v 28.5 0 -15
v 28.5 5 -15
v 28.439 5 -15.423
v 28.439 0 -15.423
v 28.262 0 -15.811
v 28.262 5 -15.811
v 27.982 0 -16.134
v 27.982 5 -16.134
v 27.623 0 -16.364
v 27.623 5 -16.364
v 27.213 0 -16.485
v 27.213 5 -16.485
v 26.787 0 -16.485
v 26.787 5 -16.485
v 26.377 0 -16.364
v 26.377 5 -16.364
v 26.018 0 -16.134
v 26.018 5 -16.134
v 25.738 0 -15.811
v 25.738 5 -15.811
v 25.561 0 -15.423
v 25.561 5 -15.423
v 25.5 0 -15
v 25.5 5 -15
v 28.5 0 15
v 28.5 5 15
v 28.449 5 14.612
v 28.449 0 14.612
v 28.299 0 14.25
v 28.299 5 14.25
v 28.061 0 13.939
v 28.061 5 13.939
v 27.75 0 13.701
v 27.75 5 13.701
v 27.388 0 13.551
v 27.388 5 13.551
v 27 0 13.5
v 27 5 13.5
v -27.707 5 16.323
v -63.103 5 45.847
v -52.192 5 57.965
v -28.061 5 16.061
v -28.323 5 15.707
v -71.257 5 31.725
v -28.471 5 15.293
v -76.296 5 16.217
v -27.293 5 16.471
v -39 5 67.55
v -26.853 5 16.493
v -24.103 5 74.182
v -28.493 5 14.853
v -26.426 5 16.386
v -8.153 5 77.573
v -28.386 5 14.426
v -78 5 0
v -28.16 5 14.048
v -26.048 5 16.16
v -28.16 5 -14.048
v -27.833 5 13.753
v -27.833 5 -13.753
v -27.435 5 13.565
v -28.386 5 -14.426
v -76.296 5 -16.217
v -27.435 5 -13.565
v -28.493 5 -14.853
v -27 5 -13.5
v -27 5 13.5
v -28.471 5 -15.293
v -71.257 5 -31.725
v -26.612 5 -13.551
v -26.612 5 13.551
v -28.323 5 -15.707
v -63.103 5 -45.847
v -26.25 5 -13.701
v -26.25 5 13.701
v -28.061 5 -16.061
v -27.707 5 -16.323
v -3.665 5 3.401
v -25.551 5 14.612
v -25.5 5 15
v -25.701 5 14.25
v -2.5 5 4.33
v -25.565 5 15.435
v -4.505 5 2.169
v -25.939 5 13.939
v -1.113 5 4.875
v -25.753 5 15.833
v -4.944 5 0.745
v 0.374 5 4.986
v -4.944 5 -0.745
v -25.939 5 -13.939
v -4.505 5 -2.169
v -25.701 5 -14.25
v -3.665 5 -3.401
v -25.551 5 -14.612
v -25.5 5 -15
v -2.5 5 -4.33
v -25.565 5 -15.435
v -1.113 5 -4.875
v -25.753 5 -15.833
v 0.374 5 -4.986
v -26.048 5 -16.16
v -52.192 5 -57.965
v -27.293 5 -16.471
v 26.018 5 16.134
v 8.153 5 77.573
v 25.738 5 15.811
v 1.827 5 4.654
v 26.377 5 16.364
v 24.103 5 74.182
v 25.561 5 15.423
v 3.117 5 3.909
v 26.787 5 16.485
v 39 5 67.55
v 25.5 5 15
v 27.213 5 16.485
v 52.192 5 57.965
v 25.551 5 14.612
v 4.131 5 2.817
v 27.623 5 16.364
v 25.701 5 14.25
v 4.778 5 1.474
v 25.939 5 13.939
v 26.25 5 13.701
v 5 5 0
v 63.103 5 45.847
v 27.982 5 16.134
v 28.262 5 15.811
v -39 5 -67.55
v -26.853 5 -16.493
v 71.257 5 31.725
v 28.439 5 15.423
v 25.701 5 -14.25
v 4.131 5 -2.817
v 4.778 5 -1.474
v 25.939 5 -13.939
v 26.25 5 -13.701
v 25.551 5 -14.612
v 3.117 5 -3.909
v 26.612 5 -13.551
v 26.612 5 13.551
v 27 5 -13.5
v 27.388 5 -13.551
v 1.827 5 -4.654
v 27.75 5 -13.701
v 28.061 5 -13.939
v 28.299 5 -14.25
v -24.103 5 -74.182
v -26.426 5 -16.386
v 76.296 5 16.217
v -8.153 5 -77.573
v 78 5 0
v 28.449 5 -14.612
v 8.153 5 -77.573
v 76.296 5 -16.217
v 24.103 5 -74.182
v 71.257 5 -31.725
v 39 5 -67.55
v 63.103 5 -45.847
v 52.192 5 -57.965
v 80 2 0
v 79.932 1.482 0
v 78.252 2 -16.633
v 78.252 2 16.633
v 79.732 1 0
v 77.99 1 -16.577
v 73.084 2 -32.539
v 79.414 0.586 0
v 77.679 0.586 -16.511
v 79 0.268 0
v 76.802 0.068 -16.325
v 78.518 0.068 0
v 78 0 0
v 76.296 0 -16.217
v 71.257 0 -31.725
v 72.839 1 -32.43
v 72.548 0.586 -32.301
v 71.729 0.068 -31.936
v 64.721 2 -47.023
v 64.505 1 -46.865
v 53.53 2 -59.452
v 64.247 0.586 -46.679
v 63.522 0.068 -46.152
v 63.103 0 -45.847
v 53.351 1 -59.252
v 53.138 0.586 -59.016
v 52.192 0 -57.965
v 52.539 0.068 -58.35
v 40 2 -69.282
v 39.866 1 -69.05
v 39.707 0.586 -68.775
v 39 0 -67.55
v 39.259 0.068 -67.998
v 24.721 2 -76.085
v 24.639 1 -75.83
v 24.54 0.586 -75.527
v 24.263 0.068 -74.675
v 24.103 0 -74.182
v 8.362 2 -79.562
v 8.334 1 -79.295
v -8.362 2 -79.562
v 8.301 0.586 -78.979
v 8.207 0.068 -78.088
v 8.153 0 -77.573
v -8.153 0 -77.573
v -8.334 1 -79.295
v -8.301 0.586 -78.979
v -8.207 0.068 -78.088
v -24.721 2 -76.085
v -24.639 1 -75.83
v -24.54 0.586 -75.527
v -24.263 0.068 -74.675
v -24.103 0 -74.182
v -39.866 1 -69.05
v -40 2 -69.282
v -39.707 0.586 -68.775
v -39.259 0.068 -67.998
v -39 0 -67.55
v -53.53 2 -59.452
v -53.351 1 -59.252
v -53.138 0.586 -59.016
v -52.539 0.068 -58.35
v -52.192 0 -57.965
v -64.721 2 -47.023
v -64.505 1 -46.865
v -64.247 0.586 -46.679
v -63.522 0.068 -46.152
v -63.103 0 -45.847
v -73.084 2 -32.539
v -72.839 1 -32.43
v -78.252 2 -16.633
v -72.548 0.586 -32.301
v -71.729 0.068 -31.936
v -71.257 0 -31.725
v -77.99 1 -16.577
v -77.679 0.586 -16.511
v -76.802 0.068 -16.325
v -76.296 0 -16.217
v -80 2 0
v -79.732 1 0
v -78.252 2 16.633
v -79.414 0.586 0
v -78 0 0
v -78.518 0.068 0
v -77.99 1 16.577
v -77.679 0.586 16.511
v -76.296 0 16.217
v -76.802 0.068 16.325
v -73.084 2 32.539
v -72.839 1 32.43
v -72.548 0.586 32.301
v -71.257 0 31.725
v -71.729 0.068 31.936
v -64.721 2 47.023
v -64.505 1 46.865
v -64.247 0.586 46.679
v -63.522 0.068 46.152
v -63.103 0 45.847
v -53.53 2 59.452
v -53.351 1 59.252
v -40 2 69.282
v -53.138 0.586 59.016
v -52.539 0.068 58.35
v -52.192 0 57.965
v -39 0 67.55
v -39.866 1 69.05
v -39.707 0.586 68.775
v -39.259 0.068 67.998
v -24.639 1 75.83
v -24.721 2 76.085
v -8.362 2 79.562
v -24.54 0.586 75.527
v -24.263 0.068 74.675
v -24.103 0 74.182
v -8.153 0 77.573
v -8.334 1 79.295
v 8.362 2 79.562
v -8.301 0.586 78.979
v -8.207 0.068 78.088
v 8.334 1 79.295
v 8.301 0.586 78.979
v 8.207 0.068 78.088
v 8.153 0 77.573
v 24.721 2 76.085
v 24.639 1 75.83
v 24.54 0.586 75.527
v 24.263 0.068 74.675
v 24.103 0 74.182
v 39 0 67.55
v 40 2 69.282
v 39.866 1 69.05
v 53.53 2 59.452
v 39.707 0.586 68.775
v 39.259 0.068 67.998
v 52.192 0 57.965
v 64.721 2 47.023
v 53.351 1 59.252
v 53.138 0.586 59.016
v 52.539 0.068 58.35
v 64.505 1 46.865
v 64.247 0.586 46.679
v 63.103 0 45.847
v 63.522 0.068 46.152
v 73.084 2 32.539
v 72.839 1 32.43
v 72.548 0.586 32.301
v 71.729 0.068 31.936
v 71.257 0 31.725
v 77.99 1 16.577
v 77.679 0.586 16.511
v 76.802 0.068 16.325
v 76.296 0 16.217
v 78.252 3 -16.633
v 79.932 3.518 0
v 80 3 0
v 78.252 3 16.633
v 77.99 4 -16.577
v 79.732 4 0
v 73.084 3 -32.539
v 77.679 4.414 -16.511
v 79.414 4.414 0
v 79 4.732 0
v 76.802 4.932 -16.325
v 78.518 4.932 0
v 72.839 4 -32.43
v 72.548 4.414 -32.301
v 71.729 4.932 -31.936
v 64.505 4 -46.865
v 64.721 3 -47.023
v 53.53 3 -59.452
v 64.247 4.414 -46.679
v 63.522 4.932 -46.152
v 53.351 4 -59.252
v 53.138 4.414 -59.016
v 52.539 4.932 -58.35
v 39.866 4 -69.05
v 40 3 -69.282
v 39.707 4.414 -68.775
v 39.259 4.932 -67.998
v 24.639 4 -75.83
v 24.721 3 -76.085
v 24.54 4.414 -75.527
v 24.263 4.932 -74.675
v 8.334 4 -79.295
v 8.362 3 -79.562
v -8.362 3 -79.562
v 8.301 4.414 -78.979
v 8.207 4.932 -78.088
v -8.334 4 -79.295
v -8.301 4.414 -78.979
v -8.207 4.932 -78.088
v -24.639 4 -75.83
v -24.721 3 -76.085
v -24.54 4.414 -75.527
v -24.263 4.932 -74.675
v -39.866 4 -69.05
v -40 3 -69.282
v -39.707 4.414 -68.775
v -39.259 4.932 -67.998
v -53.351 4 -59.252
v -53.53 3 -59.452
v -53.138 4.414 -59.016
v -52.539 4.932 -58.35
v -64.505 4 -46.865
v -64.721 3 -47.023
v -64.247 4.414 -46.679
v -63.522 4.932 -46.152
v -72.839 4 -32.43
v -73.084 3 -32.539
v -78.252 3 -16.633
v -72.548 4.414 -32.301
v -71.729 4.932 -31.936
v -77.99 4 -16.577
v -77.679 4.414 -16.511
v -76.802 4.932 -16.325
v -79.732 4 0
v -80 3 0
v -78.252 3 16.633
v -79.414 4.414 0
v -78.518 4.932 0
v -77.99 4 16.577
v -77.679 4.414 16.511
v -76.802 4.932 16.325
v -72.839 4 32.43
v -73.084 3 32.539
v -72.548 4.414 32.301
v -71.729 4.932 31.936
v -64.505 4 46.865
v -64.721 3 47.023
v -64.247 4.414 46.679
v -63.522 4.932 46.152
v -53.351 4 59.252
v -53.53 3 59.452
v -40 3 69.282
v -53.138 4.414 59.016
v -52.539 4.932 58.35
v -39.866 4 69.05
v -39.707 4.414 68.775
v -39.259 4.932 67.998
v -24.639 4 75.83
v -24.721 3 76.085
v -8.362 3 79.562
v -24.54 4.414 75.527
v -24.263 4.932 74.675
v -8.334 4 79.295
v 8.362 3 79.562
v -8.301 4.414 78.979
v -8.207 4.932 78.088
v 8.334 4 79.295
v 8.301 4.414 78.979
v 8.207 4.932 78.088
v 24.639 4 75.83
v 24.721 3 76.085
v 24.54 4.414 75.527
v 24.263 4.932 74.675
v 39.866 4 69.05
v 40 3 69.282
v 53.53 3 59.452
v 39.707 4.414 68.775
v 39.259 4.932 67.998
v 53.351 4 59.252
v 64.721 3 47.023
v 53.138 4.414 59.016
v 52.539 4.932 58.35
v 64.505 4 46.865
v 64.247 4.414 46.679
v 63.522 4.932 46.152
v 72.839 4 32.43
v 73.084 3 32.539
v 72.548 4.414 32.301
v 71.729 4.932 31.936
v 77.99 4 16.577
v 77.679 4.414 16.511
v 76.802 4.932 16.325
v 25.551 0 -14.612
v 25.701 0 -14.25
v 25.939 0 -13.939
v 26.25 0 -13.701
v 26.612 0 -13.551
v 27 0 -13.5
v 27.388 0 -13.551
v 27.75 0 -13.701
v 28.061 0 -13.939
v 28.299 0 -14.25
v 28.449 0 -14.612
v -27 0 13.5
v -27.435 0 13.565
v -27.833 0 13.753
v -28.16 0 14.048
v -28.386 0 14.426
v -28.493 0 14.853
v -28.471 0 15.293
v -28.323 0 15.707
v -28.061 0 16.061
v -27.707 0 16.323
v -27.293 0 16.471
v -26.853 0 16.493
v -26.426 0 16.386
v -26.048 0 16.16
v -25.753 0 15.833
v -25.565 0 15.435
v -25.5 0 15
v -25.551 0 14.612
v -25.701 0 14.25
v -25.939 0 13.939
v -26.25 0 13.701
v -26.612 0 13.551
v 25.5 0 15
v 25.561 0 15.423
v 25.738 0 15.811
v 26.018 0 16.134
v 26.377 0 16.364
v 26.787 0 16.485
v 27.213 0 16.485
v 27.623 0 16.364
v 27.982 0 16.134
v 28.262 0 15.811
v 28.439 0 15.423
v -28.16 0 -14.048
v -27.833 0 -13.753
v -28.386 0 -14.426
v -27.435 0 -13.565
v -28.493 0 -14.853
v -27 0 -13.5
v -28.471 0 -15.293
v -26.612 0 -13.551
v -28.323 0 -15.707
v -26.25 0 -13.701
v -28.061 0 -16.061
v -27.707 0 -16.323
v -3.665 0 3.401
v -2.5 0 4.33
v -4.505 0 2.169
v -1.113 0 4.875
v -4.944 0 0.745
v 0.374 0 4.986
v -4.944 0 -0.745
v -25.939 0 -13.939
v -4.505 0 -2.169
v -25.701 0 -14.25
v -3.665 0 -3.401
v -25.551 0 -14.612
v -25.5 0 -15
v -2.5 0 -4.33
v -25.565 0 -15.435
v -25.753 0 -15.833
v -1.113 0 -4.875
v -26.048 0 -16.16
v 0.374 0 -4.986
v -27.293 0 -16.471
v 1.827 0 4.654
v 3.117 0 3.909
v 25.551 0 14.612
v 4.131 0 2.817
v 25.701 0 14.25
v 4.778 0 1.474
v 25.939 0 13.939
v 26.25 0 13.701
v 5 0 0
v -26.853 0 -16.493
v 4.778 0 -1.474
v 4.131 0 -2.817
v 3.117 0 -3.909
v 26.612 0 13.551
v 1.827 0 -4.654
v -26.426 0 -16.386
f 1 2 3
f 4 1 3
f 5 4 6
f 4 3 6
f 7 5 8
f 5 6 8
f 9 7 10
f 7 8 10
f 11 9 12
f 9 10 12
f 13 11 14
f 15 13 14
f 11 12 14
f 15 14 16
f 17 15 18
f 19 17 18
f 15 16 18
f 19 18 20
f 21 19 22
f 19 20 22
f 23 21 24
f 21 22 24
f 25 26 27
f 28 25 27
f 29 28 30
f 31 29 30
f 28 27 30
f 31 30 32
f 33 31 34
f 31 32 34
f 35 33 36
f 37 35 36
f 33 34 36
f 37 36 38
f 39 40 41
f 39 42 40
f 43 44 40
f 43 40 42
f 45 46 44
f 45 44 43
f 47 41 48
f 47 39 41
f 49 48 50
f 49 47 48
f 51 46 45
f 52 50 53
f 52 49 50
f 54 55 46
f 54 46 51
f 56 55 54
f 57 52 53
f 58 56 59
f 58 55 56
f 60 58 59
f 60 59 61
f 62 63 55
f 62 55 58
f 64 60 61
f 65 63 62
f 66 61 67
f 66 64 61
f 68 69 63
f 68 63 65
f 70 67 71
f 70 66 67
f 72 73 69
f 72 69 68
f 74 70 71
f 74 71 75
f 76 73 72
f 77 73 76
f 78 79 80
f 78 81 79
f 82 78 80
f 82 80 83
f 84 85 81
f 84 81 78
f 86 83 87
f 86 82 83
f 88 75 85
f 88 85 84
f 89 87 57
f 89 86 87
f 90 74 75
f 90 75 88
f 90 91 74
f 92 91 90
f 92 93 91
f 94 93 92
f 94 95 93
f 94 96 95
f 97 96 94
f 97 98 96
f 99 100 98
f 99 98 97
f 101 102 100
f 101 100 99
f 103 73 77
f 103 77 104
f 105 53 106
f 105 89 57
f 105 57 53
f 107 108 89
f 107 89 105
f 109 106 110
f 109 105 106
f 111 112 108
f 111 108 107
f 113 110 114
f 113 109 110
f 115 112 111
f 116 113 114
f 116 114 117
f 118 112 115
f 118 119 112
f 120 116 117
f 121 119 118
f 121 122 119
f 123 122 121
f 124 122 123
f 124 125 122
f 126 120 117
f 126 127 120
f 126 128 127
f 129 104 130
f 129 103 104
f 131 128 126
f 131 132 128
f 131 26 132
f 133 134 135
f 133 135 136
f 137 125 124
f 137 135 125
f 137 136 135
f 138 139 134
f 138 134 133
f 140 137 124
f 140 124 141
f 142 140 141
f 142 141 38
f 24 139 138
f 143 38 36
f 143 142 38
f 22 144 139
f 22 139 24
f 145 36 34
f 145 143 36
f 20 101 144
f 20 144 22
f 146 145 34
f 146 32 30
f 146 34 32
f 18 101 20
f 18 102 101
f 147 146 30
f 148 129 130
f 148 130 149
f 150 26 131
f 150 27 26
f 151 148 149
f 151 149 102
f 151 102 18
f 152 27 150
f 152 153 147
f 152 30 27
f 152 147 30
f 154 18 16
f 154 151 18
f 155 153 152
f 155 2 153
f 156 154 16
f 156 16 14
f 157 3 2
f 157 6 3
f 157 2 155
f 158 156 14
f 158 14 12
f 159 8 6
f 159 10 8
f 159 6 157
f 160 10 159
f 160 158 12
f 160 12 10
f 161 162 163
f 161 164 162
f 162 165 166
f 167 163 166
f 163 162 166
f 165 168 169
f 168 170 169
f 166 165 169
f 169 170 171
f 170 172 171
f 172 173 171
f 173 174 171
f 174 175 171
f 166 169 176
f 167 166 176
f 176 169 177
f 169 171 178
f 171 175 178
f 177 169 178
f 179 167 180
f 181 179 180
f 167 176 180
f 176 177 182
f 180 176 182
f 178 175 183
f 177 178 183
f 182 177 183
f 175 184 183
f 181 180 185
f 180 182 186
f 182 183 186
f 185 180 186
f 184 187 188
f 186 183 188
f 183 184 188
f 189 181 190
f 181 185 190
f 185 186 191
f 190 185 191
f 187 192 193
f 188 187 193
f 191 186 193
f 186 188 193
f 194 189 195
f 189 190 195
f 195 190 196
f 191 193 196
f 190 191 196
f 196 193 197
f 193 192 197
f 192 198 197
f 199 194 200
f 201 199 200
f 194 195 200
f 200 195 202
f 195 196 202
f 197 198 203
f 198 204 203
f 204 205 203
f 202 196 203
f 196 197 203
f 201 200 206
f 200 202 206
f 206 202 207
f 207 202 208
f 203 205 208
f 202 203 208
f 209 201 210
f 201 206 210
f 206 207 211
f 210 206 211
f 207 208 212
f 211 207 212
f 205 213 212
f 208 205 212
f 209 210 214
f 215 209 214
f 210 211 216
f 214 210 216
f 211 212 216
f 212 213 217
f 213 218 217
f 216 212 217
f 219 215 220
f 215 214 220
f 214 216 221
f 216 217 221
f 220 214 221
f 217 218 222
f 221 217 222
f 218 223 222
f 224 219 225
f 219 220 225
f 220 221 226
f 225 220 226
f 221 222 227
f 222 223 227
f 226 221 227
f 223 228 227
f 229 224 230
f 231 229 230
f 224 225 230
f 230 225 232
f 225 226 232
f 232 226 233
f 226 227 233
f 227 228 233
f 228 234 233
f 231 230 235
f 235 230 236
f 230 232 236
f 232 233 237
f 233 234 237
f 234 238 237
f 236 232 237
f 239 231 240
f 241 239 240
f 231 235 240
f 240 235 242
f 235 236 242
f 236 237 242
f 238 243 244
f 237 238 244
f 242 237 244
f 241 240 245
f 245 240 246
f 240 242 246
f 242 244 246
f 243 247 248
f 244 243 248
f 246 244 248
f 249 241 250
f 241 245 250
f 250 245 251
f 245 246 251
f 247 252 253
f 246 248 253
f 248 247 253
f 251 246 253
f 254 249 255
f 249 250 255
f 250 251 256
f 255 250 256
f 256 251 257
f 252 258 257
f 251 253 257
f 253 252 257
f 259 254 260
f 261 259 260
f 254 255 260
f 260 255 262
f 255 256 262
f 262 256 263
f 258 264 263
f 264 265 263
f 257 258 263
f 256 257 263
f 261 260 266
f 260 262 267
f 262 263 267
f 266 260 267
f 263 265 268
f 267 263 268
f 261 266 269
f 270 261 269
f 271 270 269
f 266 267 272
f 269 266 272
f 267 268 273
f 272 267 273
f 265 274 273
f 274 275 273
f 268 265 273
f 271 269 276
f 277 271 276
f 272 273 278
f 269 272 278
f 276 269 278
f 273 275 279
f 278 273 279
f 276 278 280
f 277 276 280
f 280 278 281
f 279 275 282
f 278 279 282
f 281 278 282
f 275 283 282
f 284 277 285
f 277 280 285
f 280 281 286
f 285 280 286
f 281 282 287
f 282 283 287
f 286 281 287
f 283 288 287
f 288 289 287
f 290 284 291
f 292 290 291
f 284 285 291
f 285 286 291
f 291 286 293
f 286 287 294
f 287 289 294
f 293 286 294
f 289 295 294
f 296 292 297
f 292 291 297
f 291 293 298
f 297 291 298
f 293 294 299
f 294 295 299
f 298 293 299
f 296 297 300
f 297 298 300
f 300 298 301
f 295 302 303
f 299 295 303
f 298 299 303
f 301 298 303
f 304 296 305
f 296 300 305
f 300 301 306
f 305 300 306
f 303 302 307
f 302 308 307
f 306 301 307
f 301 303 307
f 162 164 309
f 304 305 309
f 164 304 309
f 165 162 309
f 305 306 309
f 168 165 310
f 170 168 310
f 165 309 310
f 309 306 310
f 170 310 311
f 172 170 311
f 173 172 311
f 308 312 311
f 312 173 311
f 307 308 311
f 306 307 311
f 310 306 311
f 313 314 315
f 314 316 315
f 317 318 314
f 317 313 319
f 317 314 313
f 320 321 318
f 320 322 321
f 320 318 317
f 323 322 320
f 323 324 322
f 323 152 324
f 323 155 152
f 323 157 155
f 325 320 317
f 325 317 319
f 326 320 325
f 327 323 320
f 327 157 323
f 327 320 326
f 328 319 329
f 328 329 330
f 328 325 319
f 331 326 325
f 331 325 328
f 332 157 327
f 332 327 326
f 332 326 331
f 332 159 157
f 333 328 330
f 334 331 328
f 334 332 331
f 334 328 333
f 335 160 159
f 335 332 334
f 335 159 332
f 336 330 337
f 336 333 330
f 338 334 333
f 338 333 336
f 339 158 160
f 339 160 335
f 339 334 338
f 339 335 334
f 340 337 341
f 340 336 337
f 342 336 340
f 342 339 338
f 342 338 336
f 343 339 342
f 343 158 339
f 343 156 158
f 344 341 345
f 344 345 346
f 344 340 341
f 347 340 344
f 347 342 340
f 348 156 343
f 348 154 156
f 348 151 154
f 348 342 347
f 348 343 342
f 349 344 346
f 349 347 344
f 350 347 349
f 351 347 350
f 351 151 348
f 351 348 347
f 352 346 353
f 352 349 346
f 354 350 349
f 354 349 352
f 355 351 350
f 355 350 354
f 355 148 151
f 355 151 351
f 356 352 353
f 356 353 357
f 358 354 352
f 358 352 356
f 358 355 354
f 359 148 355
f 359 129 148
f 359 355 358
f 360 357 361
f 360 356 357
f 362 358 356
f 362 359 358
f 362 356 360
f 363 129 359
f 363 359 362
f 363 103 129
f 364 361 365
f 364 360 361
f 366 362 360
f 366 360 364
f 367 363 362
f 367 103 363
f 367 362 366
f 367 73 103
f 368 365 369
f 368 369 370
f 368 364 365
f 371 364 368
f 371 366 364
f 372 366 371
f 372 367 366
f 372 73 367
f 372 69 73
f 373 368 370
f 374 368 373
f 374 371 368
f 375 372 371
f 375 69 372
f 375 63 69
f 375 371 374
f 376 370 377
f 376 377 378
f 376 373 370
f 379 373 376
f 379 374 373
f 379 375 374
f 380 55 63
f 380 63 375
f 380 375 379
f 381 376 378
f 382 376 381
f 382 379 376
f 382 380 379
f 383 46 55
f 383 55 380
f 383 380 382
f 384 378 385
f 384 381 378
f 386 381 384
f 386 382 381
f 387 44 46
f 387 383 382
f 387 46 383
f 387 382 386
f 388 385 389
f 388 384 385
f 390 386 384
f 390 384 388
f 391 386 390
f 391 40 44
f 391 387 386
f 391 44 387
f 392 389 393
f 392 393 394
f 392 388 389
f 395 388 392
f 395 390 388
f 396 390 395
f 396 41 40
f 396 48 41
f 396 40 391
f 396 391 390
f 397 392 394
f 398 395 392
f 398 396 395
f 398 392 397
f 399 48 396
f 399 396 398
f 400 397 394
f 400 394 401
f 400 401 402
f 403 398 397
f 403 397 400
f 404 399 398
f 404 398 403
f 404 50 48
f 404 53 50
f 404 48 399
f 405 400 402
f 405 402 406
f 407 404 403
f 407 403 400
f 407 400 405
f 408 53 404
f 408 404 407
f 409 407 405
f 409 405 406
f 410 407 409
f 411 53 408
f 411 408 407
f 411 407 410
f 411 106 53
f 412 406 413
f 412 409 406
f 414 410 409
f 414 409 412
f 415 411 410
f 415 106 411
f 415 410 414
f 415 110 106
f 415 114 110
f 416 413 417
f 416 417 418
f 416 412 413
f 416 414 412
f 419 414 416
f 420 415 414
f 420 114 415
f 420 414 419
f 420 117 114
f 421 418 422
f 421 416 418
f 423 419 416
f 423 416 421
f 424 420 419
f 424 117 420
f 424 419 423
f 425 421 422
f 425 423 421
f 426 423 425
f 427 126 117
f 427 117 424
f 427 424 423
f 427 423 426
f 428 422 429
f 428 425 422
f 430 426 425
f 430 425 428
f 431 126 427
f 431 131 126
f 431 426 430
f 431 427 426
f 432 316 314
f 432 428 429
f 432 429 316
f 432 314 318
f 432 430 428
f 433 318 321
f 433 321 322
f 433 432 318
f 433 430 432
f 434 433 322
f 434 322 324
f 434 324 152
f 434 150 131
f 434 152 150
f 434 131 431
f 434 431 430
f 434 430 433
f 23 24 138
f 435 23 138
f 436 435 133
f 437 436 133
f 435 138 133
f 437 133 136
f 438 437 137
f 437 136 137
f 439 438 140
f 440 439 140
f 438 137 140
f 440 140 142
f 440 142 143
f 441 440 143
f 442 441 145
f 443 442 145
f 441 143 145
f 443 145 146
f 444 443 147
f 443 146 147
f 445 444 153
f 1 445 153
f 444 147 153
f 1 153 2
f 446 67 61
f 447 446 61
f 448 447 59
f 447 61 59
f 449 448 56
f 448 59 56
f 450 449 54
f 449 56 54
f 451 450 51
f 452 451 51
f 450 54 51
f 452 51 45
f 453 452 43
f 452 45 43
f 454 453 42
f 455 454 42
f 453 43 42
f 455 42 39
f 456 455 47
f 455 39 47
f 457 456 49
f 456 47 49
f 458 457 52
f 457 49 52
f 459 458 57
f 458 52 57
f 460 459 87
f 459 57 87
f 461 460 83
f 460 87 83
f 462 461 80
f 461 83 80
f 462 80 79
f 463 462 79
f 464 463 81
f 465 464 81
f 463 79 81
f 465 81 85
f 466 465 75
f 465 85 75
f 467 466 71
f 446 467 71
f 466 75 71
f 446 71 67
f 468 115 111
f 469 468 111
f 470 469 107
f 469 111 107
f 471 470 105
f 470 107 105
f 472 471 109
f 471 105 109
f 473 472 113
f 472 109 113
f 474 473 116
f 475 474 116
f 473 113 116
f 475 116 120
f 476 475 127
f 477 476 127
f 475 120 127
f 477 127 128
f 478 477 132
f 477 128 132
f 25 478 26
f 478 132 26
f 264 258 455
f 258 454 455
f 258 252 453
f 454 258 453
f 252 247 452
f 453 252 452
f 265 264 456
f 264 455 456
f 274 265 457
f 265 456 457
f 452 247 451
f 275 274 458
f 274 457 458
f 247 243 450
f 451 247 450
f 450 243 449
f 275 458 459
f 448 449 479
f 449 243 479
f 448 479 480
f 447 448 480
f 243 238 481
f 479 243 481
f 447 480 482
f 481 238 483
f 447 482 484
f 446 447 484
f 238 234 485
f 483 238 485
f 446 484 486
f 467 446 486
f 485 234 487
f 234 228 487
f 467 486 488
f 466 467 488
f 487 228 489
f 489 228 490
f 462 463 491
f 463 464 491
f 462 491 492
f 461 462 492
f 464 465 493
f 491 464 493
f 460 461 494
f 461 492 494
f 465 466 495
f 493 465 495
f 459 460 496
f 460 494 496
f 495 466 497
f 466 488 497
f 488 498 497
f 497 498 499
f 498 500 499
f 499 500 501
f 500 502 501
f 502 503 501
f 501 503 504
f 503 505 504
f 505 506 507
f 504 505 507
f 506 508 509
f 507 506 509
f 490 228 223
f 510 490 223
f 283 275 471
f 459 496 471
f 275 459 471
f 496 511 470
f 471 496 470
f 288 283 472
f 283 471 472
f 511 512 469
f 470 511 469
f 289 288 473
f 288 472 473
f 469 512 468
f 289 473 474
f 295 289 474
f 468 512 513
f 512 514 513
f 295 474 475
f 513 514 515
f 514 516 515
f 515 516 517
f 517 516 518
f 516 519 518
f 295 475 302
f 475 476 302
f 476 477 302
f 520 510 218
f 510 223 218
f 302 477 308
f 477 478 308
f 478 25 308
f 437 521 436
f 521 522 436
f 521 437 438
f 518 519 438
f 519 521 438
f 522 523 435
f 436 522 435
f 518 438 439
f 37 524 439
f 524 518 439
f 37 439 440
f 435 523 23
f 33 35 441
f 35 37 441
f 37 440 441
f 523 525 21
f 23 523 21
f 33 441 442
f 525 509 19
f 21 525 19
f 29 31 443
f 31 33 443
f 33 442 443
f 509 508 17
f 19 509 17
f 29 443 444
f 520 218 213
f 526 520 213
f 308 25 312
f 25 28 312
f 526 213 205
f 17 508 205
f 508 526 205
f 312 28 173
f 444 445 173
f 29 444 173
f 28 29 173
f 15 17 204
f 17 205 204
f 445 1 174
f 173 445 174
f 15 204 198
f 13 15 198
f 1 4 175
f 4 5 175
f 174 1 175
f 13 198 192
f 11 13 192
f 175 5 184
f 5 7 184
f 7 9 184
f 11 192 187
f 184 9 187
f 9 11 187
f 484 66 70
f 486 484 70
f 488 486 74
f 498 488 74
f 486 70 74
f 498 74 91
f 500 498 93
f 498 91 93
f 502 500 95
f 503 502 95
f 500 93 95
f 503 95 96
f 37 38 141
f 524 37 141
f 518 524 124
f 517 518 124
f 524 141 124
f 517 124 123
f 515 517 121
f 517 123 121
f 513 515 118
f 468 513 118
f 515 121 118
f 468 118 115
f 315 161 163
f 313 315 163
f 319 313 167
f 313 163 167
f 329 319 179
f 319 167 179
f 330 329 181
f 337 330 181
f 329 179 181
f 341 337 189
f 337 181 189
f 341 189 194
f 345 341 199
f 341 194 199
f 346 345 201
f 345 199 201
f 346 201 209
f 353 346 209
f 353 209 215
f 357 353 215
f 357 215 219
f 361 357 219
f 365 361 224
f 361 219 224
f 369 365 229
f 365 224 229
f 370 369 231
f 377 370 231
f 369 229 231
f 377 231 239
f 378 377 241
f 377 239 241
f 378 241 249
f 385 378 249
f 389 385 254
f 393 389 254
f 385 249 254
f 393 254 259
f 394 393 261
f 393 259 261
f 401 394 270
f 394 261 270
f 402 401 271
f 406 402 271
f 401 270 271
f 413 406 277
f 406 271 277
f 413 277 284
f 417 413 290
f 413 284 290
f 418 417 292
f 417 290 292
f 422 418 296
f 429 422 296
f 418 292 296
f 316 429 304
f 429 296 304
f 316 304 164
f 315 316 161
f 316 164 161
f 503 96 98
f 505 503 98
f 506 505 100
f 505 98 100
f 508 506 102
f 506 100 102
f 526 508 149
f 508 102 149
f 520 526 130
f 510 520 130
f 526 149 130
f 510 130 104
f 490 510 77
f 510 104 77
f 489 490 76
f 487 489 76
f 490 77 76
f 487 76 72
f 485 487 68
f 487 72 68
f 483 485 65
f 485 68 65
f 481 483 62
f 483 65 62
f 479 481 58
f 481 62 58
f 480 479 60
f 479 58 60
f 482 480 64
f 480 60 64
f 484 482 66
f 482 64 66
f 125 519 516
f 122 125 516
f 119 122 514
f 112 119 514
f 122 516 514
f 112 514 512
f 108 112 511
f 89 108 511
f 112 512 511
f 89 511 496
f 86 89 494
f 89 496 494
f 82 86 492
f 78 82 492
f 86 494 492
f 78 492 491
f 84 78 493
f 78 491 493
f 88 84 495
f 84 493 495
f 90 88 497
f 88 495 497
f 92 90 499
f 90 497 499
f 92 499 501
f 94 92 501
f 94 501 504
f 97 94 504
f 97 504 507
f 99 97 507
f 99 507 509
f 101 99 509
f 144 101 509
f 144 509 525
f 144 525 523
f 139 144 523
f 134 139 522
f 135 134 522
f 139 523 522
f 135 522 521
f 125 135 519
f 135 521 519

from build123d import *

# Parameters (mm, degrees)
SKETCH1_R           = 80
BOSS_EXTRUDE1_DEPTH = 5
FILLET1_R           = 2
SKETCH2_R           = 5
CUT_EXTRUDE1_DEPTH  = 5
CUT_EXTRUDE2_DEPTH  = 6


with BuildPart() as part:
    # Sketch1 → Boss-Extrude1 (new body)
    with BuildSketch(Plane(origin=(0, 0, 0), x_dir=(1, 0, 0), z_dir=(0, 1, 0))):
        Circle(SKETCH1_R)
    extrude(amount=BOSS_EXTRUDE1_DEPTH)

    # Fillet1
    fillet1_edges = [part.edges().sort_by_distance(p)[0] for p in [
        (-80, 0, 0),
        (-80, 5, 0),
    ]]
    fillet(fillet1_edges, radius=FILLET1_R)

    # Sketch2 → Cut-Extrude1 (cut)
    with BuildSketch(Plane.XZ):
        Circle(SKETCH2_R)
    extrude(amount=-CUT_EXTRUDE1_DEPTH, mode=Mode.SUBTRACT)

    # Sketch3 → Cut-Extrude2 (cut, through all)
    with BuildSketch(Plane(origin=(0, 5, 0), x_dir=(1, 0, 0), z_dir=(0, 1, 0))):
        with BuildLine():
            Line((-27, 13.5), (-27, 15))
            Line((-27, 15), (-25.5, 15))
            ThreePointArc((-25.5, 15), (-28.060660172, 16.060660172), (-27, 13.5))
        make_face()
        with BuildLine():
            Line((-25.5, 15), (-27, 15))
            Line((-27, 15), (-27, 13.5))
            ThreePointArc((-27, 13.5), (-25.939339828, 13.939339828), (-25.5, 15))
        make_face()
        with BuildLine():
            ThreePointArc((-25.5, -15), (-25.939339828, -13.939339828), (-27, -13.5))
            Line((-27, -13.5), (-27, -15))
            Line((-27, -15), (-25.5, -15))
        make_face()
        with BuildLine():
            Line((-27, -15), (-27, -13.5))
            ThreePointArc((-27, -13.5), (-28.060660172, -16.060660172), (-25.5, -15))
            Line((-25.5, -15), (-27, -15))
        make_face()
        with BuildLine():
            ThreePointArc((28.5, -15), (28.060660172, -13.939339828), (27, -13.5))
            Line((27, -13.5), (27, -15))
            Line((27, -15), (25.5, -15))
            ThreePointArc((25.5, -15), (27, -16.5), (28.5, -15))
        make_face()
        with BuildLine():
            Line((27, -15), (27, -13.5))
            ThreePointArc((27, -13.5), (25.939339828, -13.939339828), (25.5, -15))
            Line((25.5, -15), (27, -15))
        make_face()
        with BuildLine():
            ThreePointArc((28.5, 15), (27, 16.5), (25.5, 15))
            Line((25.5, 15), (27, 15))
            Line((27, 15), (27, 13.5))
            ThreePointArc((27, 13.5), (28.060660172, 13.939339828), (28.5, 15))
        make_face()
        with BuildLine():
            Line((27, 15), (25.5, 15))
            ThreePointArc((25.5, 15), (25.939339828, 13.939339828), (27, 13.5))
            Line((27, 13.5), (27, 15))
        make_face()
    extrude(amount=-CUT_EXTRUDE2_DEPTH, mode=Mode.SUBTRACT)


solid = part.part
